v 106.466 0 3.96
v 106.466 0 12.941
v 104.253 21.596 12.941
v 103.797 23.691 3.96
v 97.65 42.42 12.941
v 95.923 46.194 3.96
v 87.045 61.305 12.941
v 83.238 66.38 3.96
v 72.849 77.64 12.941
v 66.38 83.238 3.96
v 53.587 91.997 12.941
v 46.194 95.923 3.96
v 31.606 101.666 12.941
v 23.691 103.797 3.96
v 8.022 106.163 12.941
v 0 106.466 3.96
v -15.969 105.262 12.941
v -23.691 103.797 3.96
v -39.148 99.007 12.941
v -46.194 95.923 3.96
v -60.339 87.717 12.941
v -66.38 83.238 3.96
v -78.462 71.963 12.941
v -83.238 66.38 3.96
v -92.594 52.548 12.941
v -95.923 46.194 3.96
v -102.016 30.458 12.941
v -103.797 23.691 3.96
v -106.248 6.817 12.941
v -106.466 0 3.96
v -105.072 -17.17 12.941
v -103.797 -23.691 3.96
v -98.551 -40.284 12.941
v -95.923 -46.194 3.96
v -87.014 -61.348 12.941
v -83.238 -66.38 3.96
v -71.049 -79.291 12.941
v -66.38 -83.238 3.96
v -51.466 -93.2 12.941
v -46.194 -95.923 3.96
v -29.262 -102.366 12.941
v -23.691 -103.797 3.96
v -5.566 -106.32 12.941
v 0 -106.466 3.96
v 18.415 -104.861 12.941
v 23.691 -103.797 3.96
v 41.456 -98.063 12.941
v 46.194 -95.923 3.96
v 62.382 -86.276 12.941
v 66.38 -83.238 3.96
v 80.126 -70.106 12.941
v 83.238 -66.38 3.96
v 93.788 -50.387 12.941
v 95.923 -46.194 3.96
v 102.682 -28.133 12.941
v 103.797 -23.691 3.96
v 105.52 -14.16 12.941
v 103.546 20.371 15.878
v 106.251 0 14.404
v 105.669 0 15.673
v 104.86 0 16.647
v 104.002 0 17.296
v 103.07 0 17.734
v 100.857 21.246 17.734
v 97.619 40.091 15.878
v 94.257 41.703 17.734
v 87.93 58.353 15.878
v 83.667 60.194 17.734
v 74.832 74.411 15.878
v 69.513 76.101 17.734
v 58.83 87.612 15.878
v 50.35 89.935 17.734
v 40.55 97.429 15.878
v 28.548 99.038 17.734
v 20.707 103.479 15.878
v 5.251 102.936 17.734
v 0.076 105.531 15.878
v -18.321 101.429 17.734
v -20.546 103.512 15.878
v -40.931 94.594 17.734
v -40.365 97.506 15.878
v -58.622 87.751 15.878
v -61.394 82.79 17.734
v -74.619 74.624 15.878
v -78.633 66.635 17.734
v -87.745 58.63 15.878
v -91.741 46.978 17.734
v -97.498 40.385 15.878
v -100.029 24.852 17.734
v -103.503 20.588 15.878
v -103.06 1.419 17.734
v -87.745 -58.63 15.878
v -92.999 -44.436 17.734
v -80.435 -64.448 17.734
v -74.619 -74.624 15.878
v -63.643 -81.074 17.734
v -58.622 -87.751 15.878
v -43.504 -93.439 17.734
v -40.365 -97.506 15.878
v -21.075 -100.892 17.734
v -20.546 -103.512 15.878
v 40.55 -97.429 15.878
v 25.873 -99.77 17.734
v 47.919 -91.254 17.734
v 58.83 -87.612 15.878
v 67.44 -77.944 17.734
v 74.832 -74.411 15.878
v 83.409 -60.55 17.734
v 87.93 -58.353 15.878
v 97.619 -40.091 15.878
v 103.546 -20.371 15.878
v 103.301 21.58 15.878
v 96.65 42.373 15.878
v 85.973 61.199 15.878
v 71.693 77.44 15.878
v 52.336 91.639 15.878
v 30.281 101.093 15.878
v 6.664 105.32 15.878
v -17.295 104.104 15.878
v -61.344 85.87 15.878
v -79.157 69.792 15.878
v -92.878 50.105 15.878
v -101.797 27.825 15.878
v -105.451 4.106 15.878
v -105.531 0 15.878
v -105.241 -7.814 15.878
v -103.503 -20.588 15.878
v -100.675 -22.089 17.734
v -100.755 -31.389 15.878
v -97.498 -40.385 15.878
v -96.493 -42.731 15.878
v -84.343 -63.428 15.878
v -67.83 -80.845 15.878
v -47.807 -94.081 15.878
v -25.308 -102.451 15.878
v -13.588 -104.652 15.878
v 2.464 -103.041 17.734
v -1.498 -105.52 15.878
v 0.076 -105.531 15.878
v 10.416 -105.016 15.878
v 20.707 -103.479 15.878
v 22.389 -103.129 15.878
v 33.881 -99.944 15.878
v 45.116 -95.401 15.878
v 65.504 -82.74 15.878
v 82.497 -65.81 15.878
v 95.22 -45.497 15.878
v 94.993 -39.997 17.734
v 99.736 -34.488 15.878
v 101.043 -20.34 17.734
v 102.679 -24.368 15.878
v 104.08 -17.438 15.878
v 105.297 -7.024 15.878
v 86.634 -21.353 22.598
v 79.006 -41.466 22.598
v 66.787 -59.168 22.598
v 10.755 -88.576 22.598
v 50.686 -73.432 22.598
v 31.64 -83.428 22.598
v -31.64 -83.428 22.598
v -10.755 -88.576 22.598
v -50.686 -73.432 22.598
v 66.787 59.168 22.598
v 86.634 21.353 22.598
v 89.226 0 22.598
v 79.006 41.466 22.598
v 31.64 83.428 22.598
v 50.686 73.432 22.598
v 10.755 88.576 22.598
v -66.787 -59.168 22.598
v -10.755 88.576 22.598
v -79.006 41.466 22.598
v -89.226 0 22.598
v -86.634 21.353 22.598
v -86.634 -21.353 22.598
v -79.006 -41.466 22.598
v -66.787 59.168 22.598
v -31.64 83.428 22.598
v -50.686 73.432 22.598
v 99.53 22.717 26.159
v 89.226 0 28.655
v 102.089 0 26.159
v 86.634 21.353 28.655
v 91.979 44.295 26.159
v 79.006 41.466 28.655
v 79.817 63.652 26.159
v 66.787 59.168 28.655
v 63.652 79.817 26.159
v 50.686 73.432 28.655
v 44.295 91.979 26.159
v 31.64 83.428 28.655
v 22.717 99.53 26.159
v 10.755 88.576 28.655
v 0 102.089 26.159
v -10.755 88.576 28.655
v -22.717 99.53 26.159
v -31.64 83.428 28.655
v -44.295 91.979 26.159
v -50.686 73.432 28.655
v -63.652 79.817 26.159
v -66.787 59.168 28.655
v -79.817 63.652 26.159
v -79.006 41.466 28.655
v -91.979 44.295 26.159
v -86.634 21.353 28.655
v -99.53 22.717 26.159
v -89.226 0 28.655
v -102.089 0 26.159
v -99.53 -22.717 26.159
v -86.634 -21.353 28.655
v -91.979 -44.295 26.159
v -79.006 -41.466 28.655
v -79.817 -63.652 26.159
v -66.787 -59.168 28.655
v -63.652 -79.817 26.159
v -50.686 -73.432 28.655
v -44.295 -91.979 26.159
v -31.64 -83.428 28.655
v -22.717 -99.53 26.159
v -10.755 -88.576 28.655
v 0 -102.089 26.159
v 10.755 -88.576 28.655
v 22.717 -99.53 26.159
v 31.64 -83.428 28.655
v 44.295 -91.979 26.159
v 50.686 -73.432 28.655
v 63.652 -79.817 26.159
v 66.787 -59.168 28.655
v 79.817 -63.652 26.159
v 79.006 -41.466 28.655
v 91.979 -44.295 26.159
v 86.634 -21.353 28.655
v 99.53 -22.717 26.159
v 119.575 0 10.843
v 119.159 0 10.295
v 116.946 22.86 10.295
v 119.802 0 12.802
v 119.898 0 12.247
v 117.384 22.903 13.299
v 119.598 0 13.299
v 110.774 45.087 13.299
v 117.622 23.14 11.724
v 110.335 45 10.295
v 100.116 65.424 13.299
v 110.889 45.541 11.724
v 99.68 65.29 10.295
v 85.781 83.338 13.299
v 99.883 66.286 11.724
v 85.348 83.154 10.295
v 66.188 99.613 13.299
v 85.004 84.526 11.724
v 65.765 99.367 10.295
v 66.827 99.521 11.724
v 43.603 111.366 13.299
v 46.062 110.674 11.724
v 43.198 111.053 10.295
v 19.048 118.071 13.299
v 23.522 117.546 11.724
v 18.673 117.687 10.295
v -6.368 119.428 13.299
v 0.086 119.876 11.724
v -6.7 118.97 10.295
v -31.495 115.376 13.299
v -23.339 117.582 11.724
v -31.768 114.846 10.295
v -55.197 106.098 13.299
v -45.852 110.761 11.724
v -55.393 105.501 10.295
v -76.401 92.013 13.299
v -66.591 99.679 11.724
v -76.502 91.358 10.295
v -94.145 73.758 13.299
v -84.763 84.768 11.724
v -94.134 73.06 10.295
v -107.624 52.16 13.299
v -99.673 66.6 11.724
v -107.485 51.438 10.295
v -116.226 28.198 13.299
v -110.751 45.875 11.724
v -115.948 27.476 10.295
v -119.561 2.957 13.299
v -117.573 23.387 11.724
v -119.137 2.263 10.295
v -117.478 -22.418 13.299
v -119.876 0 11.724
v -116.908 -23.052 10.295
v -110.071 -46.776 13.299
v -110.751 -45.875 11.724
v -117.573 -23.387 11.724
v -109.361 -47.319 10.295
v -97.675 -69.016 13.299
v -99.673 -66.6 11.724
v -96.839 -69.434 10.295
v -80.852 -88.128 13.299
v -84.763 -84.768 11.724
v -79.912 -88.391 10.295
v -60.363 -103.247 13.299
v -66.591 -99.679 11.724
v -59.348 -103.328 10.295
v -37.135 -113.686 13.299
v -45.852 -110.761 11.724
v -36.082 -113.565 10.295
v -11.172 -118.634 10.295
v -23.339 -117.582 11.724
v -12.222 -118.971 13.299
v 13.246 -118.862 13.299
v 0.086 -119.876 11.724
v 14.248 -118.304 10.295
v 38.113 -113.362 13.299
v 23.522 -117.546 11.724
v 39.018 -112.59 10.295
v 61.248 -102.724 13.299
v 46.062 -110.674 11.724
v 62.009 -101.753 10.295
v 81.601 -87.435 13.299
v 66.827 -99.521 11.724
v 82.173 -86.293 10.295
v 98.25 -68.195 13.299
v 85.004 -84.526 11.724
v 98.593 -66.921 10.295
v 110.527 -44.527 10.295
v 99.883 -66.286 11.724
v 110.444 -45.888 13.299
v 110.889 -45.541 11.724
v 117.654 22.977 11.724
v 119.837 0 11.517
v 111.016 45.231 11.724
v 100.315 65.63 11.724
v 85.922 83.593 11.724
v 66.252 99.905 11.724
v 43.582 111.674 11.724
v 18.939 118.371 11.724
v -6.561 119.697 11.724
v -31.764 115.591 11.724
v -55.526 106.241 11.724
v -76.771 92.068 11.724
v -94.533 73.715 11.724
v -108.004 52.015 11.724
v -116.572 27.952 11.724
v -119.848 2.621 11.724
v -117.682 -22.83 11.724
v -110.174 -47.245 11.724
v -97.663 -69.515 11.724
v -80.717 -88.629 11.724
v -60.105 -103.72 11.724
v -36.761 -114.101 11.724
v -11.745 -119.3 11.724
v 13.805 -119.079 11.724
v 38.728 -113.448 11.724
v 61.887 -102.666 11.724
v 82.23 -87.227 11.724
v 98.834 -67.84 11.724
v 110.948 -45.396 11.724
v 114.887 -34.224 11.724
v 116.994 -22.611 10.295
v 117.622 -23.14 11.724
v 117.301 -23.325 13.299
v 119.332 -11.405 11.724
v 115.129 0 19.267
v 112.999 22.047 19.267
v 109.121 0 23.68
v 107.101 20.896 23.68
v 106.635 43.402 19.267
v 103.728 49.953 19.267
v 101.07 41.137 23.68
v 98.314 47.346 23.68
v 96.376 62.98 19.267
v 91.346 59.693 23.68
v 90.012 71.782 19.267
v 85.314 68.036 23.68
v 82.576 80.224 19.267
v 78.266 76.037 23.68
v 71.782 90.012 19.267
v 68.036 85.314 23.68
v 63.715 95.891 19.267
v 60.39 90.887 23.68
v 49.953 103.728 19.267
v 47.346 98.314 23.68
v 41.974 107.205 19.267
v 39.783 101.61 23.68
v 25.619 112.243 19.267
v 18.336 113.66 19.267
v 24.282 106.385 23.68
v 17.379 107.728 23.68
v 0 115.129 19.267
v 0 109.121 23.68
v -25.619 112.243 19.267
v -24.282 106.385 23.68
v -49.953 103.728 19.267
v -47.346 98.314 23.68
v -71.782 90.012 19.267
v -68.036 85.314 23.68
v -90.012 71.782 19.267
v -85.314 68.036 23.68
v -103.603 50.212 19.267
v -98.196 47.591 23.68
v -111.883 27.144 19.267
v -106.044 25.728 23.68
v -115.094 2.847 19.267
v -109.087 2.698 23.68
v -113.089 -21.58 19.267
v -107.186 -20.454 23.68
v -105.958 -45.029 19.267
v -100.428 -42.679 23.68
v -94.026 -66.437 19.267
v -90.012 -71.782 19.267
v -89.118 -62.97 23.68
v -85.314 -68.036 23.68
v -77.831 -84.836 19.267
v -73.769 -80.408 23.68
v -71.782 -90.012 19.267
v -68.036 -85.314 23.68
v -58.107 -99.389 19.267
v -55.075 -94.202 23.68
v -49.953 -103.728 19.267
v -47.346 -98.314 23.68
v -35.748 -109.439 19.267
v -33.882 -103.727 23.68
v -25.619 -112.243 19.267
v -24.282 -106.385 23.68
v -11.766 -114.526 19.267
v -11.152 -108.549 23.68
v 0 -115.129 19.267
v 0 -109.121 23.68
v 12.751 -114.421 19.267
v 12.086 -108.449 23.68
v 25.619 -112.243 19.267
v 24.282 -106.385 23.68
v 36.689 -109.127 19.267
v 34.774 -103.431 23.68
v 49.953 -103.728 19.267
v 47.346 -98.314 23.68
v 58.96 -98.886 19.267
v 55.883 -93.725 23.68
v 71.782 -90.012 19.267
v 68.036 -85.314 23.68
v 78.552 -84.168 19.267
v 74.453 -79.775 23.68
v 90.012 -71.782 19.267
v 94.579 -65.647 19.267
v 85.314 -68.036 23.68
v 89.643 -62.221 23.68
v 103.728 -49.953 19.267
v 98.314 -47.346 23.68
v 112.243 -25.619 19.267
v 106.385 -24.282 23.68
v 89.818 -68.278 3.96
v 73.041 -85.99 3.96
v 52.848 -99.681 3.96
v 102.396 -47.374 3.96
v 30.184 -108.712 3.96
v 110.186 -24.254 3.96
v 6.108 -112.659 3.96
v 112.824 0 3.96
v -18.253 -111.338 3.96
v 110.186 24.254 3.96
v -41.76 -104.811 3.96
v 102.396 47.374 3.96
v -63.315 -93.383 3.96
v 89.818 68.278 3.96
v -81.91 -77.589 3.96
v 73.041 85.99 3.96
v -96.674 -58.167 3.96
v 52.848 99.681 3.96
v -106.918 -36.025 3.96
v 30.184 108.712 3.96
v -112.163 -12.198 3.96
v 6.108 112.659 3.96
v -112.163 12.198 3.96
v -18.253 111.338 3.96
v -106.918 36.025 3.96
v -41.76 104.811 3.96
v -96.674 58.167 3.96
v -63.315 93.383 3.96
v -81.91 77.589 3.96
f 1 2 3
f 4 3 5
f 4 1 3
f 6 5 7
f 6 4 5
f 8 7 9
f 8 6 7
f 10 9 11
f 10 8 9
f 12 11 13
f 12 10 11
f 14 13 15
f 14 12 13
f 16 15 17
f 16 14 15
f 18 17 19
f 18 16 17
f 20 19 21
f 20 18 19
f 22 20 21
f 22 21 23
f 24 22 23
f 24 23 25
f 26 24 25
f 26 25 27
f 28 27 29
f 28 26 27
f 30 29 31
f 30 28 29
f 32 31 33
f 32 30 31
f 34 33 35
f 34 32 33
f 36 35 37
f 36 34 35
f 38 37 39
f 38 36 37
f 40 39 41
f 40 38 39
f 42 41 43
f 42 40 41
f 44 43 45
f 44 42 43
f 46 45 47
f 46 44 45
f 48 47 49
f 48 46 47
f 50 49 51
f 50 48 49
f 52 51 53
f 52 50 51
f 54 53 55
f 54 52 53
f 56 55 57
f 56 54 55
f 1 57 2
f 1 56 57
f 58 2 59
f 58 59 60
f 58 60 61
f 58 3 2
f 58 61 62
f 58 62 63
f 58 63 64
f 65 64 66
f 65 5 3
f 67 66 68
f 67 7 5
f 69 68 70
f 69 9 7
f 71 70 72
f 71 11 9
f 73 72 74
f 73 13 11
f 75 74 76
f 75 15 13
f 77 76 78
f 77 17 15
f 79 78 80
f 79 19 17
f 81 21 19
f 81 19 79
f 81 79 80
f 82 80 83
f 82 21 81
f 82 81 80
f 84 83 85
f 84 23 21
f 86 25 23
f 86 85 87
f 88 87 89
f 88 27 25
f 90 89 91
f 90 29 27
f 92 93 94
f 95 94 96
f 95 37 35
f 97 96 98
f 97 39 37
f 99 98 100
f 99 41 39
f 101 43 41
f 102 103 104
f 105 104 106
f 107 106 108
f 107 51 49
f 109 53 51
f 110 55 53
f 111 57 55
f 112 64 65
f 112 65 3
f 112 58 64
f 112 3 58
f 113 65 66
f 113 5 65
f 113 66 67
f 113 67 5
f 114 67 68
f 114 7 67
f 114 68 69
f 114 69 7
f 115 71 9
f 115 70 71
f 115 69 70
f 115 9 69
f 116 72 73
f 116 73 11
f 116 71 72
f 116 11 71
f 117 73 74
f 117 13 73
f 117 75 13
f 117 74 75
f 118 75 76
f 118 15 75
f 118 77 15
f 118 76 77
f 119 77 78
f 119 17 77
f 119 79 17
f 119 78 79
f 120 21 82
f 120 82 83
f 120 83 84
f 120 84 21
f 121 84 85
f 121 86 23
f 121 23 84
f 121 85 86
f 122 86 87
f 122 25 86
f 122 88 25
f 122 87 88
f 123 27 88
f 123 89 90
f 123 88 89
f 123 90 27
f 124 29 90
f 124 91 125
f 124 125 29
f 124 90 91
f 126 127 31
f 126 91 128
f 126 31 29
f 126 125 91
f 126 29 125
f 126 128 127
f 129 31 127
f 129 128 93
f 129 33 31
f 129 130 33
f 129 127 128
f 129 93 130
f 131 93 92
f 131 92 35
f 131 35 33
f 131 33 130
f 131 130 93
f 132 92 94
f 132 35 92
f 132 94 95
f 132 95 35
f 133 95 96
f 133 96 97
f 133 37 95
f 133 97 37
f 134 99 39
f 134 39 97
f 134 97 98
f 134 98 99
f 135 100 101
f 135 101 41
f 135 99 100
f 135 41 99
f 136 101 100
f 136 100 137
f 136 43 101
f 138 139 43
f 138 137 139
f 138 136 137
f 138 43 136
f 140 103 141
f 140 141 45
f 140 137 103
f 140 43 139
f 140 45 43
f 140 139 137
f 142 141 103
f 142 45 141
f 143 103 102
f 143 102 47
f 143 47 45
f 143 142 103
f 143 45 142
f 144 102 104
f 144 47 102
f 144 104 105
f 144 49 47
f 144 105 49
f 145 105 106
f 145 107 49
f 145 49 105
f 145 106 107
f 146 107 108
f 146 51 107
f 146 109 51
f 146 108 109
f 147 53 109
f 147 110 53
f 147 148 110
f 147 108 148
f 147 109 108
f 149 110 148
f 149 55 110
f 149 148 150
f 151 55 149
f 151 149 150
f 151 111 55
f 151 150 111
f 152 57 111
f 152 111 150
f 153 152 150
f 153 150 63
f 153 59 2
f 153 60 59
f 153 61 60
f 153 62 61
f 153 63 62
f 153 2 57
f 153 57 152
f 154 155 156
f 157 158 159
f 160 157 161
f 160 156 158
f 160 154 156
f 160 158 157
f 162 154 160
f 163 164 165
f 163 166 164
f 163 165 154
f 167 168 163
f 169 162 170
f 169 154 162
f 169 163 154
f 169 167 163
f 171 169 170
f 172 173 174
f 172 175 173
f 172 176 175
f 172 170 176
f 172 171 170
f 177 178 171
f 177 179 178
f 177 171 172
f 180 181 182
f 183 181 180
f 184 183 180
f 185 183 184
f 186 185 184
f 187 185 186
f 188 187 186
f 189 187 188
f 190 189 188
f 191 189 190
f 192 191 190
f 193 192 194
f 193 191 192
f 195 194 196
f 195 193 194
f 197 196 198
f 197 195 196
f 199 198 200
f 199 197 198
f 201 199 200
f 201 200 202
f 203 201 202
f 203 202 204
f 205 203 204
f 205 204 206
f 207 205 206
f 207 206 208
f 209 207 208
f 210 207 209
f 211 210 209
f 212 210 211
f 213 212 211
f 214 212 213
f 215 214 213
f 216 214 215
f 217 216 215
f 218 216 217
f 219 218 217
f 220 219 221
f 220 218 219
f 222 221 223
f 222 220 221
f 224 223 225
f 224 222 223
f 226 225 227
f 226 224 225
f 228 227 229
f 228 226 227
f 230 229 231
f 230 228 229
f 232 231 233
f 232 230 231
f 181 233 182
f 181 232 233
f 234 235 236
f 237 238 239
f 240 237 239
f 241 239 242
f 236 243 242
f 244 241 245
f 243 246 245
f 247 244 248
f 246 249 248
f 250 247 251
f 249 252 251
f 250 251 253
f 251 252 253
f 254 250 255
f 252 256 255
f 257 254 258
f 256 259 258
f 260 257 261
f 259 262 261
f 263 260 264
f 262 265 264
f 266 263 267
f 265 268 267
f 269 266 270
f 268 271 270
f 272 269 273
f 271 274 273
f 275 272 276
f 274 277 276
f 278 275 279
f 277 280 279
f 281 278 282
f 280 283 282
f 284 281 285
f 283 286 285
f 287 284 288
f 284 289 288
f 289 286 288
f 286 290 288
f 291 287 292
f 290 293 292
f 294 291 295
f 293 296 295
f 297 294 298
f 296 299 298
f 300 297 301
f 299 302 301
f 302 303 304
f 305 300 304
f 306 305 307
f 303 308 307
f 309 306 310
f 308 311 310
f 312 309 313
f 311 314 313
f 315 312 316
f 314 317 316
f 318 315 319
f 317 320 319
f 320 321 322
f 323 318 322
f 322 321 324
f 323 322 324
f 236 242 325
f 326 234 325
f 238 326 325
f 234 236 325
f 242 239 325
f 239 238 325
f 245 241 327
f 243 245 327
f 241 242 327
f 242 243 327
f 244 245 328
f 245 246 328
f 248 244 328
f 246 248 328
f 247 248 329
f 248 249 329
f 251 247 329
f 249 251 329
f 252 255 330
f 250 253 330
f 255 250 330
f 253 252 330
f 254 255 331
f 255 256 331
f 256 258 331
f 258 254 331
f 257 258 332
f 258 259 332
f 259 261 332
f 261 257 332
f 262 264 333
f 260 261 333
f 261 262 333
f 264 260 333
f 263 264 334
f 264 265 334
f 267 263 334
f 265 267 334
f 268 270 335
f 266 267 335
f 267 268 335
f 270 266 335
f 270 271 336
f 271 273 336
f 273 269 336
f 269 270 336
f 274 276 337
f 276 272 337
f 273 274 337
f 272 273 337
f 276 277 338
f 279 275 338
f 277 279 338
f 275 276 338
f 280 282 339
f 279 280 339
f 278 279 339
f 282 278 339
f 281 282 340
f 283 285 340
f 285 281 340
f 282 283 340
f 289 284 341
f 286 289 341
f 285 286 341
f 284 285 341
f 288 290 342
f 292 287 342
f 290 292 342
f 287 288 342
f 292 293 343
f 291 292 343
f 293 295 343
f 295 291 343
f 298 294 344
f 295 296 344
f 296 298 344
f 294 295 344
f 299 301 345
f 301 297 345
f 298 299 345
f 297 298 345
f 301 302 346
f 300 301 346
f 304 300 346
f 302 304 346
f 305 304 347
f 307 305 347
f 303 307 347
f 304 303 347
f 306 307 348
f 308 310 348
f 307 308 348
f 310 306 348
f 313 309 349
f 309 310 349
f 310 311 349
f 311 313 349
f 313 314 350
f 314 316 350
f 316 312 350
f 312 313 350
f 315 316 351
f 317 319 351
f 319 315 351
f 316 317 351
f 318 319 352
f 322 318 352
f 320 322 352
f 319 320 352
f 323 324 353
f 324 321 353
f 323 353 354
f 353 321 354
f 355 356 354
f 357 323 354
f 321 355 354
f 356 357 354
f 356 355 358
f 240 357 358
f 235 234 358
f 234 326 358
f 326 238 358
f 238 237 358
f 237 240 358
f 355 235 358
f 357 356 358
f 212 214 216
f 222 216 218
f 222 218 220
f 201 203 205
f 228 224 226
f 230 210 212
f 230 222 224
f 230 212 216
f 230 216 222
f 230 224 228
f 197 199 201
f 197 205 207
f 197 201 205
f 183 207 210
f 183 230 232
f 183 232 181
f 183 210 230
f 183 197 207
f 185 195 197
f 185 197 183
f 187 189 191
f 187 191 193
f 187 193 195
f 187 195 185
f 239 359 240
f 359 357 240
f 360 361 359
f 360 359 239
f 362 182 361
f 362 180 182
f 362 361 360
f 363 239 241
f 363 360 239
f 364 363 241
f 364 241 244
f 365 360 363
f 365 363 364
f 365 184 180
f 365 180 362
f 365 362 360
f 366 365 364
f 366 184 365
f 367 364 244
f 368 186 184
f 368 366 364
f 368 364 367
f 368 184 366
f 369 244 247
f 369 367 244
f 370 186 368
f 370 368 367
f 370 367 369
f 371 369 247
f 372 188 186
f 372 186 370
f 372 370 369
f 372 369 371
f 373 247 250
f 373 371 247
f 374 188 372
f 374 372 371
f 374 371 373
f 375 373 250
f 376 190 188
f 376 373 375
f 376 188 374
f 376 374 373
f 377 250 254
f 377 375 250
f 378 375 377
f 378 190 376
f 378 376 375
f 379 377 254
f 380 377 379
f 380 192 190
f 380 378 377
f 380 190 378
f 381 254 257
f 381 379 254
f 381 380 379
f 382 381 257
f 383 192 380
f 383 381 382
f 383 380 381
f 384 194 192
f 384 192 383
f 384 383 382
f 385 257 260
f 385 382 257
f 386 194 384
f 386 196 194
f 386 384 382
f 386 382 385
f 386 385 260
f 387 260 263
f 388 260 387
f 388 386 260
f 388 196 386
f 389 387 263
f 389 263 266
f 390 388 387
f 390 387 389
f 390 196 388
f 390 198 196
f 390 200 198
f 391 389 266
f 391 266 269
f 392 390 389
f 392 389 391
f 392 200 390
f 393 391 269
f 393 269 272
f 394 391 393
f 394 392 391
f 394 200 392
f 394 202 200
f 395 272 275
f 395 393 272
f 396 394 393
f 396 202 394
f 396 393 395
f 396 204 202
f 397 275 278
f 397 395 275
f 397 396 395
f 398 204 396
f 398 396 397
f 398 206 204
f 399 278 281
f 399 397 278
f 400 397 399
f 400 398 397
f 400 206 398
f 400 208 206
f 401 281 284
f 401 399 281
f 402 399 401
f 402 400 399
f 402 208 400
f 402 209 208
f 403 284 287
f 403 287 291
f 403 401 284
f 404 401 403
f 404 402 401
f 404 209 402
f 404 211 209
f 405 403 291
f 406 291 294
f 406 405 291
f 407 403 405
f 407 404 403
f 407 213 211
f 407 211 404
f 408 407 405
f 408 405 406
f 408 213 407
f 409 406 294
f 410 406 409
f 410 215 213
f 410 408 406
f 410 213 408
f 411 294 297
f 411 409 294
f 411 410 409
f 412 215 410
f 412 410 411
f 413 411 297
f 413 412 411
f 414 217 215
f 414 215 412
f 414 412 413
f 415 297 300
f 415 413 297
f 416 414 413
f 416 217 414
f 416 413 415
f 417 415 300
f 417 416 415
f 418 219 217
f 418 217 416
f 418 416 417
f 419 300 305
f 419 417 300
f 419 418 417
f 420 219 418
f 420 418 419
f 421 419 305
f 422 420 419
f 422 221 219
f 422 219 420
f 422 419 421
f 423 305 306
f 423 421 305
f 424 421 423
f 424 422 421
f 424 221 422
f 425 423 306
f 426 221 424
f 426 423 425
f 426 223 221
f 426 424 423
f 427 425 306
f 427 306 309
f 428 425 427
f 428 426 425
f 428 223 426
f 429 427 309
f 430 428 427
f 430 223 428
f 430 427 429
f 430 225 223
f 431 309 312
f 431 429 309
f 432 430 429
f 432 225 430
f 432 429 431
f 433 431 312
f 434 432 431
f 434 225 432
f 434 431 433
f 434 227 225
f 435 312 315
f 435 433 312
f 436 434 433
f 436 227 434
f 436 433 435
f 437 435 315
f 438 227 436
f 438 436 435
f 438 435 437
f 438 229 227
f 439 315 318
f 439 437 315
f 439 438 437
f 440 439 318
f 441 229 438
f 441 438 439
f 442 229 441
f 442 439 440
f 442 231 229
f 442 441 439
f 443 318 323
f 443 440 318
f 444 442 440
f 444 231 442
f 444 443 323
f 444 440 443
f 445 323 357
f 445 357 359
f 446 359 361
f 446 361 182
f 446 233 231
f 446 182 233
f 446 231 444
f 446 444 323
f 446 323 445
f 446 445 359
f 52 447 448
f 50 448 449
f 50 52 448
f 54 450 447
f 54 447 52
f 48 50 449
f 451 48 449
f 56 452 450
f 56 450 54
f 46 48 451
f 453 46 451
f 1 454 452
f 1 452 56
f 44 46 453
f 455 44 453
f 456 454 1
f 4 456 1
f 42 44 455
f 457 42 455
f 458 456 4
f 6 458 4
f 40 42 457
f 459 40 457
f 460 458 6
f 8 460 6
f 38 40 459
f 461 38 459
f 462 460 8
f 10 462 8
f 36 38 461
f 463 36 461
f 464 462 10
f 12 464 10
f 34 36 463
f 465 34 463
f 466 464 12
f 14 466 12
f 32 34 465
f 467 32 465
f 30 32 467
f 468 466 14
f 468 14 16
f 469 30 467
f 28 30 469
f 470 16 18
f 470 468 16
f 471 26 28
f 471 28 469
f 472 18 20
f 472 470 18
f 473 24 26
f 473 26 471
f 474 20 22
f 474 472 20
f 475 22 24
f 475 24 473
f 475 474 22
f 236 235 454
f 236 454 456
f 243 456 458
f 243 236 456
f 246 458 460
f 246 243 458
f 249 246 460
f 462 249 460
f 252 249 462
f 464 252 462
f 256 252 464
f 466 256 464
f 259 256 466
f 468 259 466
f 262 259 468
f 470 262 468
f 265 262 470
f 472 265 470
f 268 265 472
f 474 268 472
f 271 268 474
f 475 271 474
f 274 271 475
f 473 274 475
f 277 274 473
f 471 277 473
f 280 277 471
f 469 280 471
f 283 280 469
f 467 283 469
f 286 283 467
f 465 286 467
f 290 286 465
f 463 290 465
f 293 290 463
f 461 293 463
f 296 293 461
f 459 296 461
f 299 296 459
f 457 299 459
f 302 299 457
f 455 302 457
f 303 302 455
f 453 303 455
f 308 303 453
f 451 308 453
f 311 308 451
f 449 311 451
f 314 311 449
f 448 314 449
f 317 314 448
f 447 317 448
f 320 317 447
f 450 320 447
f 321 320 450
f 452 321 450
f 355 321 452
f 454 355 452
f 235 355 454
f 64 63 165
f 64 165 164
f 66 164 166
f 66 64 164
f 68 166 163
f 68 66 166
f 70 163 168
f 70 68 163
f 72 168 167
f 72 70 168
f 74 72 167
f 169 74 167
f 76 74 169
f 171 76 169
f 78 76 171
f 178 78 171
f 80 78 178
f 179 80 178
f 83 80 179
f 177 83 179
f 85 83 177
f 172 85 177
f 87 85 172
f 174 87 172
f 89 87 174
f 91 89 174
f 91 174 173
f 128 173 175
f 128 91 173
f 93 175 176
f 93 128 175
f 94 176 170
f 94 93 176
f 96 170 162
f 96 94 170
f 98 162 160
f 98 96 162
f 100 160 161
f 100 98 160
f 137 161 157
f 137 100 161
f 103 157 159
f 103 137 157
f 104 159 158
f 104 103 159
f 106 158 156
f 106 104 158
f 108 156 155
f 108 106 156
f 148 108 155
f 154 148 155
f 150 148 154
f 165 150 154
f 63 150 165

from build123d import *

# Parameters (mm, degrees)
F2_SIZE = 7.62
F4_R    = 2.54
F5_R    = 5.08


# Not quite as in the source:
# - a fillet or chamfer that OpenCascade refuses, or shapes differently, is made with other operations: its cross-section is extruded or revolved along the edge and cut away or added


with BuildPart() as f1:
    # F0 (on Front) → F1 (revolve)
    with BuildSketch(Plane.XZ):
        Polygon((89.2264246941, 28.6549665034), (0, 28.6549665034), (0, 22.5978214294), (89.2264246941, 22.5978214294), (106.4660027623, 16.5406726301), (106.4660027623, 3.9604459889), (120.4440295696, 3.9604459889), (120.4440295696, 22.5978214294), align=None)
    revolve(axis=Axis((0, 0, 25.6263939664), (0, 0, 1)))

    # F2
    f2_edges = [f1.edges().sort_by_distance(p)[0] for p in [
        (-120.44403, 0, 3.960446),
    ]]
    chamfer(f2_edges, length=F2_SIZE)

    # F3: fillet of radius 25.4 on 1 edges, made by hand

    # F3_s1 → F3_t2 (revolve, cut)
    with BuildSketch(Plane.XZ):
        with BuildLine():
            ThreePointArc((120.4440295696, 11.5804459889), (113.0489234012, 21.1136915786), (102.0892995141, 26.1591857039))
            Line((102.0892995141, 26.1591857039), (120.4440295696, 22.5978214294))
            Line((120.4440295696, 22.5978214294), (120.4440295696, 11.5804459889))
        make_face()
    revolve(axis=Axis((0, 0, 22.5978214294), (0, 0, 1)), mode=Mode.SUBTRACT)

    # F4
    f4_edges = [f1.edges().sort_by_distance(p)[0] for p in [
        (-120.44403, 0, 11.580446),
    ]]
    fillet(f4_edges, radius=F4_R)

    # F5
    f5_edges = [f1.edges().sort_by_distance(p)[0] for p in [
        (-106.466003, 0, 16.540673),
    ]]
    fillet(f5_edges, radius=F5_R)


solid = f1.part
